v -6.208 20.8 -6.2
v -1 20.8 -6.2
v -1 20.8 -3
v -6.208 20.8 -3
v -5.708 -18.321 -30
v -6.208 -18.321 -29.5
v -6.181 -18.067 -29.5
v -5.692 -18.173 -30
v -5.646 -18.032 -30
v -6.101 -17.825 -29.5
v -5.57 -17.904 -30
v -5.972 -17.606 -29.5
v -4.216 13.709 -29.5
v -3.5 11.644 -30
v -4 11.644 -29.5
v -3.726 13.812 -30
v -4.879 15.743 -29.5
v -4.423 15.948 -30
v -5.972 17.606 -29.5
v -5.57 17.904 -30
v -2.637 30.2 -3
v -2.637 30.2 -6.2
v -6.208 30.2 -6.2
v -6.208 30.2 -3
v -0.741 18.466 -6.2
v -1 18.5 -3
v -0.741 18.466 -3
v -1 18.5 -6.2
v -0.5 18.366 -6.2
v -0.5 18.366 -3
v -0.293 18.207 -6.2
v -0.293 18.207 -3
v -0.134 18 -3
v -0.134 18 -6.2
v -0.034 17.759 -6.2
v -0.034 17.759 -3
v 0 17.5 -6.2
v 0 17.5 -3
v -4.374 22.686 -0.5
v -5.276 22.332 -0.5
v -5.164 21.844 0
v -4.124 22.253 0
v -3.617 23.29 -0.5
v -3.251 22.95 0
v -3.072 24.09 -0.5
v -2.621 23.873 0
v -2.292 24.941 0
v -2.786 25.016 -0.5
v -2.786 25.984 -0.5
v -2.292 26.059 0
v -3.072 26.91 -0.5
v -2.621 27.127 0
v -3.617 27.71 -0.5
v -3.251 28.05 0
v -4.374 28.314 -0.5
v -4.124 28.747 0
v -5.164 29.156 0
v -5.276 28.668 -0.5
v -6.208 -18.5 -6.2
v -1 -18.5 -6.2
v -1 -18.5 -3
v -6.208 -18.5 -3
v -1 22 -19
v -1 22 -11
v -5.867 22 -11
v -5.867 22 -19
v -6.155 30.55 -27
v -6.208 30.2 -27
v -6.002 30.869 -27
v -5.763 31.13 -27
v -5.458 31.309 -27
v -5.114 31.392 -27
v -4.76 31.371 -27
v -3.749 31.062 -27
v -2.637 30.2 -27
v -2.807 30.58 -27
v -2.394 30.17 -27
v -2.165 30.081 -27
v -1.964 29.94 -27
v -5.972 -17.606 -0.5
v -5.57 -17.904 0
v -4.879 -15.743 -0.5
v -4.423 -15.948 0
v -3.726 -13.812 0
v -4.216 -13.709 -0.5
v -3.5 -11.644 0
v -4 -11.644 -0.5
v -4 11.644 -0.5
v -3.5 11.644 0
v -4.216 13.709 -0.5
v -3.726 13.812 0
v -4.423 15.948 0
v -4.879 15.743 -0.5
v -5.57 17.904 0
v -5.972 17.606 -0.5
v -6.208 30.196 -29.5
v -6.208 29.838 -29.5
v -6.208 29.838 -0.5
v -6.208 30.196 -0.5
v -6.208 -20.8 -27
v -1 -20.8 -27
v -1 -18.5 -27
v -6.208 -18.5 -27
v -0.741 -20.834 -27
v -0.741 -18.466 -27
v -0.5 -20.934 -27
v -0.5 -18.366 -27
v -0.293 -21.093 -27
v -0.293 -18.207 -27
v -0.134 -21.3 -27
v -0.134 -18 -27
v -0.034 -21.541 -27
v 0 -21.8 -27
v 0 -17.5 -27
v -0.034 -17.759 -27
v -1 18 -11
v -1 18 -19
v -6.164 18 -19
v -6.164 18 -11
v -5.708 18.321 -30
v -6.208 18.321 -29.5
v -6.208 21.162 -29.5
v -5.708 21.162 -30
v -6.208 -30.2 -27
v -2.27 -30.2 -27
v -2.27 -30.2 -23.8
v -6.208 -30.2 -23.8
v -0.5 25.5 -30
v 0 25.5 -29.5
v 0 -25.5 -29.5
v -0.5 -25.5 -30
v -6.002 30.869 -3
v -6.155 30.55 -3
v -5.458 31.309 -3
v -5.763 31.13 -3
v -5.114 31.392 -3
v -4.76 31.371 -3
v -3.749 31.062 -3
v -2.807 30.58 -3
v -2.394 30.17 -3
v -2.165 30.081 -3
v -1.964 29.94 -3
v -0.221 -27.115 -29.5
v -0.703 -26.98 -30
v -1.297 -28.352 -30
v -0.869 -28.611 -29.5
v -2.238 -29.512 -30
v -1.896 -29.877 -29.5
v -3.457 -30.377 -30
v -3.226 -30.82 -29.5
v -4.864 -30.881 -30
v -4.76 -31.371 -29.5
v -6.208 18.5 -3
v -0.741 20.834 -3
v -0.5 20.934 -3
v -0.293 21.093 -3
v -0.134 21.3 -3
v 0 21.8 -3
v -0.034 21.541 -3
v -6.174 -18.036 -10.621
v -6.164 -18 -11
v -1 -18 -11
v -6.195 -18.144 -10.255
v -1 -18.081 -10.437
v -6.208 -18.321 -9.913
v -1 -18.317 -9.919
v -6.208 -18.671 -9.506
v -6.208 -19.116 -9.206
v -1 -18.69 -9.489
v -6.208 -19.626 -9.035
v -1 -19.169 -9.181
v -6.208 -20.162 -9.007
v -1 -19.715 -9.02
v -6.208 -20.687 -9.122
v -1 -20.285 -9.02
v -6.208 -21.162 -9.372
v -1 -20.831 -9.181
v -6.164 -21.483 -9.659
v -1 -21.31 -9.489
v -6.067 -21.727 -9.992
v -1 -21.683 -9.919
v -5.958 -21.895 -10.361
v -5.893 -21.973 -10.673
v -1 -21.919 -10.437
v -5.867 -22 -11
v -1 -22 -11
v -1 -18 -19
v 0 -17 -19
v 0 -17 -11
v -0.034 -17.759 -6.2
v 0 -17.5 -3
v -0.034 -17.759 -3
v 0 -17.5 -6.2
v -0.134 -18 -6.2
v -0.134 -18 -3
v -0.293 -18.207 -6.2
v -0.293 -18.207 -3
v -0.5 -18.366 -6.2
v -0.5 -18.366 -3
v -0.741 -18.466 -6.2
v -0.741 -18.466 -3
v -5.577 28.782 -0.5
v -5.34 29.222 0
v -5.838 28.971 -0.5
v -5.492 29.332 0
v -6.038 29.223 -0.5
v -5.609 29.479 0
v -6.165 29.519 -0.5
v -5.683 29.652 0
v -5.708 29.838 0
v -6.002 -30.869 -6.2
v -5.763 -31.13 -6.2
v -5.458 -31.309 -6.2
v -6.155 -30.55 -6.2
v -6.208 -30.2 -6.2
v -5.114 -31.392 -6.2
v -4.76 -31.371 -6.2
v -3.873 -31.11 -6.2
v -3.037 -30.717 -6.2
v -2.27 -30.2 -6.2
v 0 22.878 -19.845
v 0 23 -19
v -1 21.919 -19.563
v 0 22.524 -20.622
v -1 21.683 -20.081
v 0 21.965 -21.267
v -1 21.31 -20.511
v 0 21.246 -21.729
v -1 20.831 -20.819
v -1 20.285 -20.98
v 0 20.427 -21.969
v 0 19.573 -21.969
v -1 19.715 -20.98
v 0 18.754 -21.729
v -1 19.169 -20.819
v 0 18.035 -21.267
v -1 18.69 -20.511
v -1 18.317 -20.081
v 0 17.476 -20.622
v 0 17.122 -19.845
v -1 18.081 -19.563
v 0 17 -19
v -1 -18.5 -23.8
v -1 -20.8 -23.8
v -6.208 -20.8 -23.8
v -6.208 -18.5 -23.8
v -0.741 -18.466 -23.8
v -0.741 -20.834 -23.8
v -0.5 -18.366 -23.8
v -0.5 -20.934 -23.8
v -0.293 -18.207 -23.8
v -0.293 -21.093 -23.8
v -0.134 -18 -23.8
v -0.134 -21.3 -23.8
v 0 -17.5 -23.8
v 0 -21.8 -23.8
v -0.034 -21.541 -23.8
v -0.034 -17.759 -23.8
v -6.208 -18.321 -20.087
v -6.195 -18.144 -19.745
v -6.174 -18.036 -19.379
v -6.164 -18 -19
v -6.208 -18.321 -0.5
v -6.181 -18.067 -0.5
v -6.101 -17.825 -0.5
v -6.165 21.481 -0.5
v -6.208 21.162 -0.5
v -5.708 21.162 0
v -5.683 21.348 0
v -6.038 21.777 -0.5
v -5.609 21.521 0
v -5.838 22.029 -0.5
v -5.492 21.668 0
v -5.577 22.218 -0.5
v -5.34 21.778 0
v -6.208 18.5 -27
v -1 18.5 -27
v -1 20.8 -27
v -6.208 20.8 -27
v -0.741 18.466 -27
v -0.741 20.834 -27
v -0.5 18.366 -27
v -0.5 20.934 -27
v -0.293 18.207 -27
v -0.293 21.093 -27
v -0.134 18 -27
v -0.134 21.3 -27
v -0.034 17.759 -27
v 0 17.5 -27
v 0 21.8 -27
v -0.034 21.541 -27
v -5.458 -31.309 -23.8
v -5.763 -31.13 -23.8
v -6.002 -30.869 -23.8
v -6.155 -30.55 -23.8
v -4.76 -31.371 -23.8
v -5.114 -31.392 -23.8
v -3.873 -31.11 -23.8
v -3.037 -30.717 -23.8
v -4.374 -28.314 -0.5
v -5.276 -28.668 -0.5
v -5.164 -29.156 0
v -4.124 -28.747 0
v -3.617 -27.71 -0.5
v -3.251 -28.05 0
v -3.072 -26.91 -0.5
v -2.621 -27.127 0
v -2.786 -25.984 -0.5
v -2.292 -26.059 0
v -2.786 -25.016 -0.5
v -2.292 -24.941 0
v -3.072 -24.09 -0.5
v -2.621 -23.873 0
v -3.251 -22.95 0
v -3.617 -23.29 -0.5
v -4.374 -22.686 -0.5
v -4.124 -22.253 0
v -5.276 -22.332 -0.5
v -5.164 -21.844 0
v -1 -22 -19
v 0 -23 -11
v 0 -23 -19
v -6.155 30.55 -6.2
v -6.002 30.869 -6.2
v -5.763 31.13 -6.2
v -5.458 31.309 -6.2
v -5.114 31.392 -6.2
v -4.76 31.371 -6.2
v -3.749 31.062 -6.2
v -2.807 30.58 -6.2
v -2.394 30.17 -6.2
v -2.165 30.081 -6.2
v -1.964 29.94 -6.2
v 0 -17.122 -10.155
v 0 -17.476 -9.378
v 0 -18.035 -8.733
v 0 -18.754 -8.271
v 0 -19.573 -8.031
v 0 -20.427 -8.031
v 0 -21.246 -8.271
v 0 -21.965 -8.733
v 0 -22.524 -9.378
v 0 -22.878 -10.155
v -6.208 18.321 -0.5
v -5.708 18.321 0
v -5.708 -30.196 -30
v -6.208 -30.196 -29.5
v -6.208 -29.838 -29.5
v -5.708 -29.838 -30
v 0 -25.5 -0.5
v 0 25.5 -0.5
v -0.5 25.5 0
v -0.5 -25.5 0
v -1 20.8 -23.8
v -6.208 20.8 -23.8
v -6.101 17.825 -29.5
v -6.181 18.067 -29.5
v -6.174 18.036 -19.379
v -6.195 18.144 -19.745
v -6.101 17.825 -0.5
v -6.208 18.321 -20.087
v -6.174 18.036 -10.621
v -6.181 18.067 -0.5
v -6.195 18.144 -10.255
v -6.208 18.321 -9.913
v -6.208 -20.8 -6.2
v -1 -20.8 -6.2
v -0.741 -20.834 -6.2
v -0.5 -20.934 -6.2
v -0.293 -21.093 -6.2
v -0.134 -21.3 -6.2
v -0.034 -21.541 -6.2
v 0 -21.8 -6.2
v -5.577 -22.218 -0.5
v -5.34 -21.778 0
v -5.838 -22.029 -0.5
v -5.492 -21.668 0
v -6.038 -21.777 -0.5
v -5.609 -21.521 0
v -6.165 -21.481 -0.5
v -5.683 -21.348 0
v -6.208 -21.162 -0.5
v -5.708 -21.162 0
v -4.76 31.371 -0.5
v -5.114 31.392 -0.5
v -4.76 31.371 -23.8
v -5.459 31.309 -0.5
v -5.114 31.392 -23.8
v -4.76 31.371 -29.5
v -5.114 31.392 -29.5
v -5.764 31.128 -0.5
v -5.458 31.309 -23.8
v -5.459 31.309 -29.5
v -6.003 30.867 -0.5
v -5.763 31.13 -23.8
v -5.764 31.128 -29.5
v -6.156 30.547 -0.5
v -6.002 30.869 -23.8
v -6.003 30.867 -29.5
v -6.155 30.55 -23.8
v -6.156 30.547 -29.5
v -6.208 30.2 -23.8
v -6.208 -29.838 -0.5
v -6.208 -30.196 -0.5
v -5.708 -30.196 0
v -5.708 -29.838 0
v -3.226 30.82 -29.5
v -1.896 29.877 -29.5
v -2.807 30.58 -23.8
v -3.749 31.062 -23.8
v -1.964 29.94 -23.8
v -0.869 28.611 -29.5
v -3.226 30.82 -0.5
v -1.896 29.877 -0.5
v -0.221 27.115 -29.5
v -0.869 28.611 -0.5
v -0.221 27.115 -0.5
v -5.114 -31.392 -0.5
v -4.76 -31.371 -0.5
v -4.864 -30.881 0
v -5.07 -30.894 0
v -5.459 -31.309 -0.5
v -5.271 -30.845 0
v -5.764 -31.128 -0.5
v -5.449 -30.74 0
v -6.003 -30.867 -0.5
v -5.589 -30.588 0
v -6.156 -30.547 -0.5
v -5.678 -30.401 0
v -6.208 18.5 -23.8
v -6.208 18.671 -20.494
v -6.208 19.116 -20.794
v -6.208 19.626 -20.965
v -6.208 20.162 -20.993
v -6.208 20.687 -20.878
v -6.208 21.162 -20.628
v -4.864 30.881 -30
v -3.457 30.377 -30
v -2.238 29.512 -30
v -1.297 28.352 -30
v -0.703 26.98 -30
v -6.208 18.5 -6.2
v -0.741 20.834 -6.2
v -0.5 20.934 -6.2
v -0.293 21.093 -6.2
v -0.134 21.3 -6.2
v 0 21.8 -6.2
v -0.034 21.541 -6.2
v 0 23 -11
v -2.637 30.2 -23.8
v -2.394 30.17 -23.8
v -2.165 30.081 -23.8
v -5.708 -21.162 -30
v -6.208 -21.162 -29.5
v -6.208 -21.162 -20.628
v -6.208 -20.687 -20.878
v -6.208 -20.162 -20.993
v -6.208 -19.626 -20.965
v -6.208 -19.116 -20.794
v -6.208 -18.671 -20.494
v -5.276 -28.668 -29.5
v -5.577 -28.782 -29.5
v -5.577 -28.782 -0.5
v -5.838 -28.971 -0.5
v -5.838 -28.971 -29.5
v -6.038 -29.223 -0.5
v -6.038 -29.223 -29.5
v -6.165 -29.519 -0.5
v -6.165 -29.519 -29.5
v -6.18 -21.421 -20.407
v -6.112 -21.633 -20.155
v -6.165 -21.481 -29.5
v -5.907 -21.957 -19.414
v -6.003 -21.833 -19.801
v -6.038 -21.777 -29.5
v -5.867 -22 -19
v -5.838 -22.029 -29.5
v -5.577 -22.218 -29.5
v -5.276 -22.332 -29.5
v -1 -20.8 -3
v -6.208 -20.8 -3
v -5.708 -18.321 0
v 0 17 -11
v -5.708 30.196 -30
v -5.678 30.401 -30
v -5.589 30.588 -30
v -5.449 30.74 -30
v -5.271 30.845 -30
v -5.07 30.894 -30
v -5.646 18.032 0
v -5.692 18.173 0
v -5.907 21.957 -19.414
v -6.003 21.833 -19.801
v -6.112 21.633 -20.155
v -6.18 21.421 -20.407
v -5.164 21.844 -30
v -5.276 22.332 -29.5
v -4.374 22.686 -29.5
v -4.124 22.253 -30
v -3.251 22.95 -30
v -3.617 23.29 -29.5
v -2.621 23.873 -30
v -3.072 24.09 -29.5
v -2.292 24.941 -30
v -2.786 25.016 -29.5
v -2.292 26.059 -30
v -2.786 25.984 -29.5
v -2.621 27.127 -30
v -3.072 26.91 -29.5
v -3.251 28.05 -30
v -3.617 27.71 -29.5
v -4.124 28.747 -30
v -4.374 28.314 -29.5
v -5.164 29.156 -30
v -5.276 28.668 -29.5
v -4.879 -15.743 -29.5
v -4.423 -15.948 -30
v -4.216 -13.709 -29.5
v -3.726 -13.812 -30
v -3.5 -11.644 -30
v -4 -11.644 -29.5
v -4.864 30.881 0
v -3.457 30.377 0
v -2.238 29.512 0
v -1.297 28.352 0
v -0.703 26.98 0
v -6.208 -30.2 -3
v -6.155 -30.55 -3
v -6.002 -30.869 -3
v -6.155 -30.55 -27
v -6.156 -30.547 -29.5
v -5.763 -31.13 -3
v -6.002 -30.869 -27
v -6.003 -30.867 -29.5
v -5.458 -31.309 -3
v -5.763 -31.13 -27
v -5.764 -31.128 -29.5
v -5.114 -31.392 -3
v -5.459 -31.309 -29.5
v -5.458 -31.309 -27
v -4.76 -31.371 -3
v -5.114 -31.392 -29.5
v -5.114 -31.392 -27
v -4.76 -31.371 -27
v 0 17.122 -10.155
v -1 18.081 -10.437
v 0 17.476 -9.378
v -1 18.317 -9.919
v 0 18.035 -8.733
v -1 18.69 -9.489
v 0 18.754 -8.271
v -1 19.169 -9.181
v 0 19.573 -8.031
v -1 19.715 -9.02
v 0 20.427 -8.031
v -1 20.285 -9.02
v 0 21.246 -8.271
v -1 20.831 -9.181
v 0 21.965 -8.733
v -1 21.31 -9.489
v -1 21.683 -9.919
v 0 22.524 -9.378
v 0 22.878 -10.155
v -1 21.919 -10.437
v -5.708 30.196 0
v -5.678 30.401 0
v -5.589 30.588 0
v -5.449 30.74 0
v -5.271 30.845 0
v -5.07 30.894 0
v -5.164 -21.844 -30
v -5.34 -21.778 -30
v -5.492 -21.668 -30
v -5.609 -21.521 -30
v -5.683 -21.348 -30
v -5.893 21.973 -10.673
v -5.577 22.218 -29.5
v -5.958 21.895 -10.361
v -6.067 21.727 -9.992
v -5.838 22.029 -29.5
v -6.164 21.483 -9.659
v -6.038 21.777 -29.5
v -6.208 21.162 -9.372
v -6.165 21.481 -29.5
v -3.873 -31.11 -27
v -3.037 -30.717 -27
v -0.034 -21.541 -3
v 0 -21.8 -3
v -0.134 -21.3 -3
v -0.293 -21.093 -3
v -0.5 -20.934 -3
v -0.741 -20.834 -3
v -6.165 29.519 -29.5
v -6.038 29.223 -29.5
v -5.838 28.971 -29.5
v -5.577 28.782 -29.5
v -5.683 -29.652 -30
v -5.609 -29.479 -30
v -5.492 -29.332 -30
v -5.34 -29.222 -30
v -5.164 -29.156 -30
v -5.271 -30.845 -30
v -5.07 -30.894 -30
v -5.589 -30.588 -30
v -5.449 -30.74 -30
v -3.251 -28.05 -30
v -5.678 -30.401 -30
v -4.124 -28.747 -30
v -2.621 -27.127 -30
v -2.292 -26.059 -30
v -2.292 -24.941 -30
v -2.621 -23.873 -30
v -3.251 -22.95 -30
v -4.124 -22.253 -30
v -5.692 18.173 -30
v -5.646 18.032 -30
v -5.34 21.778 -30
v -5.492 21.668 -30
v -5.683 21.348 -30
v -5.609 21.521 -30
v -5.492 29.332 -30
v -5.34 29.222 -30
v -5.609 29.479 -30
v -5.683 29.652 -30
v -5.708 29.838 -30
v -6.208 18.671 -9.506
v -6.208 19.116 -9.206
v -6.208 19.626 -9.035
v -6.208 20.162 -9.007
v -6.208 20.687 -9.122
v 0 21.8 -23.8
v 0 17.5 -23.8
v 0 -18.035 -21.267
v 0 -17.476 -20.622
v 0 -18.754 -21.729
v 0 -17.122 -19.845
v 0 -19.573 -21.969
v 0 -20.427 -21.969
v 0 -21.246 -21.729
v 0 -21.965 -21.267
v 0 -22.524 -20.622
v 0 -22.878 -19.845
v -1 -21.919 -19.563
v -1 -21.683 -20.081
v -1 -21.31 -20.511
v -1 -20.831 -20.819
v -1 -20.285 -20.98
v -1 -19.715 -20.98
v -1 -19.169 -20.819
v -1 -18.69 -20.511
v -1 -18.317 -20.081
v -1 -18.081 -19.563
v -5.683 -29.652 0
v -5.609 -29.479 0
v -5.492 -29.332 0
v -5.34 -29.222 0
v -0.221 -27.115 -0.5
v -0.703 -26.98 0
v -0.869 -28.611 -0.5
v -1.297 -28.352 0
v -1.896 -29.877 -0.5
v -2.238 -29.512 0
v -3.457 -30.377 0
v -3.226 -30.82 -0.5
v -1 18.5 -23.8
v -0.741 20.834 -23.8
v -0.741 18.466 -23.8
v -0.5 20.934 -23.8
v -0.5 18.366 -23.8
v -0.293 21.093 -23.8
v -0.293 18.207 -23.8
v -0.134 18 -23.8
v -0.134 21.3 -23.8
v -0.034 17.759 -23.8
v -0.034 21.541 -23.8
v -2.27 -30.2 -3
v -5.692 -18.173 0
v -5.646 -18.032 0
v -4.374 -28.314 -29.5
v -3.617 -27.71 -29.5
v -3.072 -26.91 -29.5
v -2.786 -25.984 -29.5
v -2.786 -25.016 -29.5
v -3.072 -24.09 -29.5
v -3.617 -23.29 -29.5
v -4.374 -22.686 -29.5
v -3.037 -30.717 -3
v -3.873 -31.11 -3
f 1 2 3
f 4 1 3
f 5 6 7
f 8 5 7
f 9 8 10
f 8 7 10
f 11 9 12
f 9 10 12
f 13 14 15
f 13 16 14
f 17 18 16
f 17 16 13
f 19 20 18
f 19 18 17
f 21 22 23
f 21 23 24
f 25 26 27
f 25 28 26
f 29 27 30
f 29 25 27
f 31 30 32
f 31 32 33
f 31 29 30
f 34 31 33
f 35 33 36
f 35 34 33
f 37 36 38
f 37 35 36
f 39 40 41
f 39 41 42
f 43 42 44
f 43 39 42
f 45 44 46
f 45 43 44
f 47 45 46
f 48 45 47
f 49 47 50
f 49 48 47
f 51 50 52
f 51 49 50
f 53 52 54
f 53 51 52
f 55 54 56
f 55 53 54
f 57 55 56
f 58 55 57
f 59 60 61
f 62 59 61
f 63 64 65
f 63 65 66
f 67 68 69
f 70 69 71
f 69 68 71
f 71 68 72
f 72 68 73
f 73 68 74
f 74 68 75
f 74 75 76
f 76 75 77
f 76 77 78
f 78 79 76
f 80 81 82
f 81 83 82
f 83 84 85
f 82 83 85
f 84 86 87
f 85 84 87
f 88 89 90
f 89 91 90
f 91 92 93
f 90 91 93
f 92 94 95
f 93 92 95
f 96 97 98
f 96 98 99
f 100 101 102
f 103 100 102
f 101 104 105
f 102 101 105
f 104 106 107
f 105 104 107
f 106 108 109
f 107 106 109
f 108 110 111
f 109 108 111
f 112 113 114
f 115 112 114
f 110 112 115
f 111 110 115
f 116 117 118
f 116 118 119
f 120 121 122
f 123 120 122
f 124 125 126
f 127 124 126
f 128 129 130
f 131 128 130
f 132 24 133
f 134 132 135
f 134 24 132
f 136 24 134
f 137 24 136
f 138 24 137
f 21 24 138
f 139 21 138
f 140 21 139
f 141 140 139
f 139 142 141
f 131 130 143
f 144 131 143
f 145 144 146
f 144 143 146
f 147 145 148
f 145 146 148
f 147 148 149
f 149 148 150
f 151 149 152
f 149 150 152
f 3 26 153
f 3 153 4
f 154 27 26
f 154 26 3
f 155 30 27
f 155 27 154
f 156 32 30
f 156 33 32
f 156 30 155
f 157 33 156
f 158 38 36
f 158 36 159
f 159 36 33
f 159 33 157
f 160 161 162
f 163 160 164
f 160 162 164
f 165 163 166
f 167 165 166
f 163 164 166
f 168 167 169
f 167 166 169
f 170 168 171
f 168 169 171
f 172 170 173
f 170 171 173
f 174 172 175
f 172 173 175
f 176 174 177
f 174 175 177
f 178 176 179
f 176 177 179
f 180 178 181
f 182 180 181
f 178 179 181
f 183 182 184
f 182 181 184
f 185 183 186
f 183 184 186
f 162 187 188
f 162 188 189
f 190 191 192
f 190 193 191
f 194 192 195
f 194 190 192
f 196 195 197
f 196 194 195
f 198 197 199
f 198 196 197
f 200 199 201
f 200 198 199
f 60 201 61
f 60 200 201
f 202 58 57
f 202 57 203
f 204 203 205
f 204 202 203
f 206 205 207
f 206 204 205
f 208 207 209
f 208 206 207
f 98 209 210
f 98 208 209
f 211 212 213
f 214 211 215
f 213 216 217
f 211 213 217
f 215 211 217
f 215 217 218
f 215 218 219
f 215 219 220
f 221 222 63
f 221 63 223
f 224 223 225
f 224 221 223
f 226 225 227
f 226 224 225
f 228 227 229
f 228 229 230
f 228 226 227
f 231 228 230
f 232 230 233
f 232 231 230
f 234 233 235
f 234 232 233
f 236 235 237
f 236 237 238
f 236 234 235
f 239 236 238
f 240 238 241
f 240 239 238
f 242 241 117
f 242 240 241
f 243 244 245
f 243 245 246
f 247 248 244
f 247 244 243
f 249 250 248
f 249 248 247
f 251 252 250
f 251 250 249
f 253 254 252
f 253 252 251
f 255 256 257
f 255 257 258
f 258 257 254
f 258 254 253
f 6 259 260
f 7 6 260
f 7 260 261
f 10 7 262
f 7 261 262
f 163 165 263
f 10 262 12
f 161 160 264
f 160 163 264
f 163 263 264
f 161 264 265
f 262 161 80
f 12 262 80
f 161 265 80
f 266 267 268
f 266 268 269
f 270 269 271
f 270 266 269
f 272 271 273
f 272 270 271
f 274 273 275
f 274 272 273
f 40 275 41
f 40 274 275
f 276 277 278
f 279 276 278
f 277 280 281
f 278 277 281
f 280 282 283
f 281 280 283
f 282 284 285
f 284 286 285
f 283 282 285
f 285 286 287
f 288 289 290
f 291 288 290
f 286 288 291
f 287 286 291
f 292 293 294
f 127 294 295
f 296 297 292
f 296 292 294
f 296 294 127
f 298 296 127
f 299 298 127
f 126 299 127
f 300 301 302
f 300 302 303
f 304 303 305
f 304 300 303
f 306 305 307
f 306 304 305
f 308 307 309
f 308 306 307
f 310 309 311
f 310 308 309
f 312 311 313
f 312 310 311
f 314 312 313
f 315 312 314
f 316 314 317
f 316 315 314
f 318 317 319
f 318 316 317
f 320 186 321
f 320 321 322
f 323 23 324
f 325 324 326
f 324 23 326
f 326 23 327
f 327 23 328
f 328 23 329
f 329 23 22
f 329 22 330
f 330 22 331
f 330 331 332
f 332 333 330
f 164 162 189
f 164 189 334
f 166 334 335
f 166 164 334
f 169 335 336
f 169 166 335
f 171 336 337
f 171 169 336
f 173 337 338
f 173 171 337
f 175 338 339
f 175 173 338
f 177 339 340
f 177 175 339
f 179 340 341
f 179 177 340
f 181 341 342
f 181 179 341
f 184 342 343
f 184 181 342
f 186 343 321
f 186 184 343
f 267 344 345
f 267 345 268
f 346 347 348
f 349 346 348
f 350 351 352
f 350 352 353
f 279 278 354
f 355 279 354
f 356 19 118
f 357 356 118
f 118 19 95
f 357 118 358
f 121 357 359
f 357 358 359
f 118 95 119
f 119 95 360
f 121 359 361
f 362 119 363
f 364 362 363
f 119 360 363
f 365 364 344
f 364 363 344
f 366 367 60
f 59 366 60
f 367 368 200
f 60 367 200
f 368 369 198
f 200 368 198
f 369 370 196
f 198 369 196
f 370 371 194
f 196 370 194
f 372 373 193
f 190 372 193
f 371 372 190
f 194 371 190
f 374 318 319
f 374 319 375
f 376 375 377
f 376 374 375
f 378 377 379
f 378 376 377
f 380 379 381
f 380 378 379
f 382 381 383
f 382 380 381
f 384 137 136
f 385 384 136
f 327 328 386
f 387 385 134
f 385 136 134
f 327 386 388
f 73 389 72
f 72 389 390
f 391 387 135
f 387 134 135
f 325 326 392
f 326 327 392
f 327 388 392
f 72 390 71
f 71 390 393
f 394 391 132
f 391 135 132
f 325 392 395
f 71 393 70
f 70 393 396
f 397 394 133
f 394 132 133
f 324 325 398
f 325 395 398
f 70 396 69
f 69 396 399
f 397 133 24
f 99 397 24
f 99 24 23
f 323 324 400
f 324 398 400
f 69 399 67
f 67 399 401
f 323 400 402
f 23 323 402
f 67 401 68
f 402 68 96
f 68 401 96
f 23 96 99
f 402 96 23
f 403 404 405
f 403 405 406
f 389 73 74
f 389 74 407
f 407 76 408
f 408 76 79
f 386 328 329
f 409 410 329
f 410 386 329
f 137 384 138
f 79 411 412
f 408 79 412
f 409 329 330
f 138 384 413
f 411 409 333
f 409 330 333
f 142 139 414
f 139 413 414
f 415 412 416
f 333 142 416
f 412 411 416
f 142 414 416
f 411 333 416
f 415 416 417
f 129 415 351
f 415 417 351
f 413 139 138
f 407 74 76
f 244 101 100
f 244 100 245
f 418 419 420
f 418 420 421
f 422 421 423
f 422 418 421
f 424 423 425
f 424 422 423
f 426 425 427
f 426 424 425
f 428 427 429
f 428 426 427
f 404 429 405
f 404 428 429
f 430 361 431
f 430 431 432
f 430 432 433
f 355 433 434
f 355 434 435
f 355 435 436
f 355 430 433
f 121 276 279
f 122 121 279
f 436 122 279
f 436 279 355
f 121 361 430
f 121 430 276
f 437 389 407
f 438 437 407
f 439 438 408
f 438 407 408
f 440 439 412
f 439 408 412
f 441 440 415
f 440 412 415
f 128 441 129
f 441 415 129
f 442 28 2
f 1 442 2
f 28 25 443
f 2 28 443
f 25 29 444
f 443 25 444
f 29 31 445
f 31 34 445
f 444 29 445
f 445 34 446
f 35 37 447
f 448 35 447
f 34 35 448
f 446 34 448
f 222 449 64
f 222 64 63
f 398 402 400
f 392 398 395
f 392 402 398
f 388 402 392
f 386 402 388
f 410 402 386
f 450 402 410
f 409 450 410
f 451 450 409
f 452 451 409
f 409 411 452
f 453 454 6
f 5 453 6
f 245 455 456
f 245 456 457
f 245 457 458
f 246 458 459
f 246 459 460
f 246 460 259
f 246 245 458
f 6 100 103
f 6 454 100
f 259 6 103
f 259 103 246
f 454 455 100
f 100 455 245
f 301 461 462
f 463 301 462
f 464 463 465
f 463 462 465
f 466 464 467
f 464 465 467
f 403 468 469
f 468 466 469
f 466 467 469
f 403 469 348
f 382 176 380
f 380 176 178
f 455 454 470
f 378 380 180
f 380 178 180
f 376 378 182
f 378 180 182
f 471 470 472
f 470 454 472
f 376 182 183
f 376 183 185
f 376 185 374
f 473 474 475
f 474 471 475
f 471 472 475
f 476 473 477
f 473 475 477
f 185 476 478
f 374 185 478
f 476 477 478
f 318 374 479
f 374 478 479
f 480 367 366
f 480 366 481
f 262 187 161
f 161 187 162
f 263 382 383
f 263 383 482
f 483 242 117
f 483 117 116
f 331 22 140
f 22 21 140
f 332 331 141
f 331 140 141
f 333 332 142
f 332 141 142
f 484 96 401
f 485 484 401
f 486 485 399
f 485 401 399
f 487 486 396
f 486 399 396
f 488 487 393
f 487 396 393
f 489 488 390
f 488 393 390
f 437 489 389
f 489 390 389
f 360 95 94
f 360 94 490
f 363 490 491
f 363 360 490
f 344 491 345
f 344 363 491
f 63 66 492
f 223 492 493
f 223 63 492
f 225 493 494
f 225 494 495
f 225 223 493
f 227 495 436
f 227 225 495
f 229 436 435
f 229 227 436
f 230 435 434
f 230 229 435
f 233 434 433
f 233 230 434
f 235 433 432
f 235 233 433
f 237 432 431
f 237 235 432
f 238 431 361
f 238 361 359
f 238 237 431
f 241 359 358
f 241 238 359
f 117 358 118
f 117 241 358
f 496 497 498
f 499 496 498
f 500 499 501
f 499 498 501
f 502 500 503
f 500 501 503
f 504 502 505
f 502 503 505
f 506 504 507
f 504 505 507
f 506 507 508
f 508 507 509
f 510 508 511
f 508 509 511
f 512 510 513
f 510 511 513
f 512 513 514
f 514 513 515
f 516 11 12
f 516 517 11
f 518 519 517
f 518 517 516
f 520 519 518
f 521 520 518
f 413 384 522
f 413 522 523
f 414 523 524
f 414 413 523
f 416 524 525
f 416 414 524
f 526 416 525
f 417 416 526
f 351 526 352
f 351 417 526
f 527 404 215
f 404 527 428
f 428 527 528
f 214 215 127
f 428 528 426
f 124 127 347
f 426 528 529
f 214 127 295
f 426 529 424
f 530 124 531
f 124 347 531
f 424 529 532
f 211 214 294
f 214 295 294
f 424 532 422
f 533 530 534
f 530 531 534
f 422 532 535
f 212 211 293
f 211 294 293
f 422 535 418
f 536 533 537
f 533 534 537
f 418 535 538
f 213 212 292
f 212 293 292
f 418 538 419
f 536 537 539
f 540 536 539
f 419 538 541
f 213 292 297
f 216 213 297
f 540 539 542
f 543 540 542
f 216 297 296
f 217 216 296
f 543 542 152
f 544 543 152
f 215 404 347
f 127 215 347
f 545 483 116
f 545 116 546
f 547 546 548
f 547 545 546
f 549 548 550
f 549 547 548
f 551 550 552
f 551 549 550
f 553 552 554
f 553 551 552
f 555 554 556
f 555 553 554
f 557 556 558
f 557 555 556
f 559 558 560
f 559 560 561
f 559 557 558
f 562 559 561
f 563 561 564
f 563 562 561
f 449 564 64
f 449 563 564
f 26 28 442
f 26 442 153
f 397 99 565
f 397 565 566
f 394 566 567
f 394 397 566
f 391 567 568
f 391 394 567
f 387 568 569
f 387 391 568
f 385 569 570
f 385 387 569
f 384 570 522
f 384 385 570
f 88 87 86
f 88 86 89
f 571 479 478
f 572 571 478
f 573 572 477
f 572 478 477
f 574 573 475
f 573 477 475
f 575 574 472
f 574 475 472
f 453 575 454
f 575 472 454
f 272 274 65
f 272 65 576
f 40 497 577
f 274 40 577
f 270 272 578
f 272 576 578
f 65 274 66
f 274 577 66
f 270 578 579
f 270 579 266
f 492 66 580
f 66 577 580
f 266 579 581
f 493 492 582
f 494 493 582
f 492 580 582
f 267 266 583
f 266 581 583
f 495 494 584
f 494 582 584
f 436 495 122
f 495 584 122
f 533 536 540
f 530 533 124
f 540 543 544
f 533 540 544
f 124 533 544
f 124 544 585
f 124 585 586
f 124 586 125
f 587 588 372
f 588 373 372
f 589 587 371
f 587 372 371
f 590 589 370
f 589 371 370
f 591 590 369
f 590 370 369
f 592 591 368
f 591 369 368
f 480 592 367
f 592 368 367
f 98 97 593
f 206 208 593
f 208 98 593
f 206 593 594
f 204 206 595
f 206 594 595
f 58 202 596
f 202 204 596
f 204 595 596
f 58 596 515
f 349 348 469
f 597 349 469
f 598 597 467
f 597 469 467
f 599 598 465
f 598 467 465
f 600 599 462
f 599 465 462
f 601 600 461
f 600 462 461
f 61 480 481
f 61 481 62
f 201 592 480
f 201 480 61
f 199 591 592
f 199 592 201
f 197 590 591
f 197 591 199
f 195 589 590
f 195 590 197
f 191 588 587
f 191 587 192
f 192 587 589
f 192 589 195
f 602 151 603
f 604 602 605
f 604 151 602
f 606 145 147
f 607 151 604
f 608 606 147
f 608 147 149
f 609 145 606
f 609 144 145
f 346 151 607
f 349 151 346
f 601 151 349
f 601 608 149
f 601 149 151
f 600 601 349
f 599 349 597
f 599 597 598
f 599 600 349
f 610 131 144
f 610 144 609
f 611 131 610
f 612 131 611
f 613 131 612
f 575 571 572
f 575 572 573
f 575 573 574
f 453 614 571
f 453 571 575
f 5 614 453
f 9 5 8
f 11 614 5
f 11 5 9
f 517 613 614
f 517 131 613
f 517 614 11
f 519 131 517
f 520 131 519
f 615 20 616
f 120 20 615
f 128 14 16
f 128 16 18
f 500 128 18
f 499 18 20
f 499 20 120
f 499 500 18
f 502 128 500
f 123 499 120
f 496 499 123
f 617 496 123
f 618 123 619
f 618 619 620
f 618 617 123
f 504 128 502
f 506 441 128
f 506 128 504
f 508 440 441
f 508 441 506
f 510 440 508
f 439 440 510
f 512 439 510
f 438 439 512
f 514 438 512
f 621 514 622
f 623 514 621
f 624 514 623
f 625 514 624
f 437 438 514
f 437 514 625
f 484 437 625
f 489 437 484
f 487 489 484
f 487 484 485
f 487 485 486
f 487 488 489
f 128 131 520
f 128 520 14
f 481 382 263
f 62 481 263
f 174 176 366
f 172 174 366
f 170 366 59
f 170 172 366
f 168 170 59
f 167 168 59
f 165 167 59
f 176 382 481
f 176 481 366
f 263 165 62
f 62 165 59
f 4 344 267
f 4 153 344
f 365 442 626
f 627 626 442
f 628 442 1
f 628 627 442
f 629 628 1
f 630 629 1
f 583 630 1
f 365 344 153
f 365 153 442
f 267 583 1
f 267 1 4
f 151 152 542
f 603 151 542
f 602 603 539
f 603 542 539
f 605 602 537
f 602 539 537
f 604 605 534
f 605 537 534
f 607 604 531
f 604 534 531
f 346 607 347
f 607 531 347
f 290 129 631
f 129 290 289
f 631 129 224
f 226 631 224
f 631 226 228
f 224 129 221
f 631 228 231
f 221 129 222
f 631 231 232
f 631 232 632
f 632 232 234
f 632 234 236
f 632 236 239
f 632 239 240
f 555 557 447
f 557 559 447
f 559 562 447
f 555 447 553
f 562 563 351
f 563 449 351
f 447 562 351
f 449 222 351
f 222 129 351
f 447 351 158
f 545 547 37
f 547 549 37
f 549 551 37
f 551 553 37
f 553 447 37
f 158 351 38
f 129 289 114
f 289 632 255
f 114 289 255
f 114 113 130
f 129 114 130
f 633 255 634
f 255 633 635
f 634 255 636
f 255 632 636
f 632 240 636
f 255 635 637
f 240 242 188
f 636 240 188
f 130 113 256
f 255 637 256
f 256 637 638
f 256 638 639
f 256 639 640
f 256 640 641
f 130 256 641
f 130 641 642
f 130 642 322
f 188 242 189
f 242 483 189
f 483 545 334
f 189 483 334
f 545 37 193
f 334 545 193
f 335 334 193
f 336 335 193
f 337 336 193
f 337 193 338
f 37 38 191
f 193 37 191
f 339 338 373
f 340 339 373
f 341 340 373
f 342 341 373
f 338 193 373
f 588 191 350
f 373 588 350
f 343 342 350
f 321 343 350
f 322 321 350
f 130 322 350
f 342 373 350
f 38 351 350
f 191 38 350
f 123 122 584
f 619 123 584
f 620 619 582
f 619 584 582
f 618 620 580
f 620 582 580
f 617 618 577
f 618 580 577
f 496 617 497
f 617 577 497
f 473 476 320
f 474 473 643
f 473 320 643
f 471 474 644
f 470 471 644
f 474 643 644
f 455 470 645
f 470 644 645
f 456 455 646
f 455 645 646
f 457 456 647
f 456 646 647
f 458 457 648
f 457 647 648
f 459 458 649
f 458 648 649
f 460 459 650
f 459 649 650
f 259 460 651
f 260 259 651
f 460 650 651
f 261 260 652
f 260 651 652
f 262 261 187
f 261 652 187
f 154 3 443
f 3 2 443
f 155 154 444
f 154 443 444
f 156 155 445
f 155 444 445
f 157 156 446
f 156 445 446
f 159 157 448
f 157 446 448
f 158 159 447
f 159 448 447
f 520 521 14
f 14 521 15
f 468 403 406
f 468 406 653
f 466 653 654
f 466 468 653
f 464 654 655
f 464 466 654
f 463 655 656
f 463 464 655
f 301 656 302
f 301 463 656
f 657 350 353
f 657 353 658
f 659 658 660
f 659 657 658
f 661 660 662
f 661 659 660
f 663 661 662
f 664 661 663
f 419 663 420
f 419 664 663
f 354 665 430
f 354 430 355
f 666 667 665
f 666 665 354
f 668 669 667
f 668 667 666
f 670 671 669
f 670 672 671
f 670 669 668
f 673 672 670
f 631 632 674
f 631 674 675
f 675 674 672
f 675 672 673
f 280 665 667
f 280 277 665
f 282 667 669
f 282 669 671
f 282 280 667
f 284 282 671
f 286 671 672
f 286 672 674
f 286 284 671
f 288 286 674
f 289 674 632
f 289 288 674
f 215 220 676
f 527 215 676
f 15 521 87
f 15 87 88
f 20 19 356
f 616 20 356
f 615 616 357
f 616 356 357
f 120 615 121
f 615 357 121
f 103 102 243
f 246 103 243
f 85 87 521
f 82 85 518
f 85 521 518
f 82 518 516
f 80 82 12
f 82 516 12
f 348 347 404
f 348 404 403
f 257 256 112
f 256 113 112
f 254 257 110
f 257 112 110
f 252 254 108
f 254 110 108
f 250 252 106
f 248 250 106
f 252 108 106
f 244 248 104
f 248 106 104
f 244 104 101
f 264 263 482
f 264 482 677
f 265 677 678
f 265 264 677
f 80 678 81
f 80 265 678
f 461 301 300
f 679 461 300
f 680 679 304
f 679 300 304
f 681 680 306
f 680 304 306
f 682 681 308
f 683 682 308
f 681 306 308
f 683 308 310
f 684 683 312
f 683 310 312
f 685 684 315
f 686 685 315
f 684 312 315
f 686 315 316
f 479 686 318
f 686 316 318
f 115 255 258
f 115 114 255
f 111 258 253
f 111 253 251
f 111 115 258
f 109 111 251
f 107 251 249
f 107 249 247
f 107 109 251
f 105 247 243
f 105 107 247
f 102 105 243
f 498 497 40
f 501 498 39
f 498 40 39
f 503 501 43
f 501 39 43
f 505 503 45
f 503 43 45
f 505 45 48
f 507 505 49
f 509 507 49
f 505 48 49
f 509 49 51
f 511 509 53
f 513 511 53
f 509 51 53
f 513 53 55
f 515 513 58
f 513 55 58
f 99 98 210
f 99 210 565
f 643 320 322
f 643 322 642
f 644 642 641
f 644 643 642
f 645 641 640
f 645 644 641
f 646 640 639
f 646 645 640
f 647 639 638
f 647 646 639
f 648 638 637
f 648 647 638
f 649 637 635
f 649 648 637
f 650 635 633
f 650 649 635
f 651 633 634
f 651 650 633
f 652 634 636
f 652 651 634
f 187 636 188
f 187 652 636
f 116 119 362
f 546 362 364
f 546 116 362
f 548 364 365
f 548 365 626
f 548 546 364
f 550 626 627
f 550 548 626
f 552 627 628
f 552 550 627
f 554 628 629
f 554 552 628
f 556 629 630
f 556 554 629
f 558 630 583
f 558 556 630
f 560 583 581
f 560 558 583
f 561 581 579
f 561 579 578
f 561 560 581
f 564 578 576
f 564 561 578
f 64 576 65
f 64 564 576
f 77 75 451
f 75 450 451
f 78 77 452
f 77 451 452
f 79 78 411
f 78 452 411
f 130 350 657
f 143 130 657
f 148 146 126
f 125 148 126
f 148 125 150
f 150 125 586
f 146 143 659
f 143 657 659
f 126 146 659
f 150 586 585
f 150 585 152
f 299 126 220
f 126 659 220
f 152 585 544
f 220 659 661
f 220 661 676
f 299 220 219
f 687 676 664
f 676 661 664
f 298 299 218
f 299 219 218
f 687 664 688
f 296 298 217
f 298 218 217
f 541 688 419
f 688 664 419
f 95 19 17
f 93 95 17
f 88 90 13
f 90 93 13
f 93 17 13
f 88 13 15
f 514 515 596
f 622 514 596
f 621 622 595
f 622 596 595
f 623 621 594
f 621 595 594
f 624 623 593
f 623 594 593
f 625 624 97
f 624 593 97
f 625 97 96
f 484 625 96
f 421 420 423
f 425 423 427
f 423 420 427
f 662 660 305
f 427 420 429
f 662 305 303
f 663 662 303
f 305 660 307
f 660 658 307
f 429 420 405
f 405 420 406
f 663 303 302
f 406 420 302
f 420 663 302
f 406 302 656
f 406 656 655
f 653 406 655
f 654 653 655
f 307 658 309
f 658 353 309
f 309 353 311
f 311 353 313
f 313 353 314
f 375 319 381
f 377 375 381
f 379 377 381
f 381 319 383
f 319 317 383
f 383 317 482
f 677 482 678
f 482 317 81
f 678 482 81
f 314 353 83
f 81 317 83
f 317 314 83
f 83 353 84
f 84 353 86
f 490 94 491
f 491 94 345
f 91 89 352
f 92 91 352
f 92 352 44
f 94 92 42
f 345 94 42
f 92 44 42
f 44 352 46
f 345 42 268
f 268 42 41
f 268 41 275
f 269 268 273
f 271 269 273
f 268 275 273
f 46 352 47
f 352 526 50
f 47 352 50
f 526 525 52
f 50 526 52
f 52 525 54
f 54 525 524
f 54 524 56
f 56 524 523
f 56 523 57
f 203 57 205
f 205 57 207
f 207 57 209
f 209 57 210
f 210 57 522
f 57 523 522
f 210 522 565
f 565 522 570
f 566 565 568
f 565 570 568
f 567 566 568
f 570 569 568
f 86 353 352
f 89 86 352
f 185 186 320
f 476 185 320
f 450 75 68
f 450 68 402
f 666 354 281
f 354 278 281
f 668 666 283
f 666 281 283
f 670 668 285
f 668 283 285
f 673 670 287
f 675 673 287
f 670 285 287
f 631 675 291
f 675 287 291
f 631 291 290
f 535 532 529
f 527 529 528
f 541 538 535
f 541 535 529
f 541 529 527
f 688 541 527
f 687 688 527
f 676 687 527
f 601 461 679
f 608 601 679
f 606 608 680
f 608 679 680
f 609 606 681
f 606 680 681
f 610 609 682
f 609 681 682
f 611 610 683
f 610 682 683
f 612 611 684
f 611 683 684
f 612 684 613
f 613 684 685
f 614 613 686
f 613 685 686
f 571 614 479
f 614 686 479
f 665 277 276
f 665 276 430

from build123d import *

# Parameters (mm, degrees)
CROQUIS1_R                 = 3.25
SALIENTE_EXTRUIR1_DEPTH    = 30
REDONDEO1_R                = 10
CORTAR_EXTRUIR1_DEPTH      = 46.124827032
CROQUIS3_W                 = 19.168620823
CROQUIS3_H                 = 82.221468015
CORTAR_EXTRUIR2_DEPTH      = 46.124827032
CORTAR_EXTRUIR7_DEPTH      = 44.68352107
CORTAR_EXTRUIR7_DEPTH_BACK = 44.68352107
CROQUIS4_W                 = 3.2
CROQUIS4_H                 = 2.3
REDONDEO2_R                = 1.2
REDONDEO4_R                = 1
CHAMFER1_SIZE              = 0.5
CHAMFER2_SIZE              = 1


with BuildPart() as part:
    # Croquis1 → Saliente-Extruir1 (new body)
    with BuildSketch(Plane.XY):
        with BuildLine():
            Line((-4, 17.433827309), (-8.98691391, 20.296314259))
            ThreePointArc((-8.98691391, 20.296314259), (-9.006535925, 30.69237342), (0, 25.5))
            Line((0, 25.5), (0, -25.5))
            ThreePointArc((0, -25.5), (-9.006535925, -30.69237342), (-8.98691391, -20.296314259))
            Line((-8.98691391, -20.296314259), (-4, -17.433827309))
            Line((-4, -17.433827309), (-4, 17.433827309))
        make_face()
        with Locations((-6, 25.5)):
            Circle(CROQUIS1_R, mode=Mode.SUBTRACT)
        with Locations(Location((-6, -25.5, 0), (0, 0, 180))):
            Circle(CROQUIS1_R, mode=Mode.SUBTRACT)
    extrude(amount=-SALIENTE_EXTRUIR1_DEPTH)

    # Redondeo1
    redondeo1_edges = [part.edges().sort_by_distance(p)[0] for p in [
        (-4, -17.433827309, -15),
        (-4, 17.433827309, -15),
    ]]
    fillet(redondeo1_edges, radius=REDONDEO1_R)

    # Croquis2 → Cortar-Extruir1 (cut, through all)
    with BuildSketch(Plane(origin=(0, 0, 0), x_dir=(0, 0, -1), z_dir=(1, 0, 0))):
        with BuildLine():
            Line((11, 22), (19, 22))
            ThreePointArc((19, 22), (21, 20), (19, 18))
            Line((19, 18), (11, 18))
            ThreePointArc((11, 18), (9, 20), (11, 22))
        make_face()
        with BuildLine():
            Line((11, -22), (19, -22))
            ThreePointArc((19, -22), (21, -20), (19, -18))
            Line((19, -18), (11, -18))
            ThreePointArc((11, -18), (9, -20), (11, -22))
        make_face()
    extrude(amount=-CORTAR_EXTRUIR1_DEPTH, mode=Mode.SUBTRACT)

    # Croquis3 → Cortar-Extruir2 (cut, through all)
    with BuildSketch(Plane(origin=(0, 0, -30), x_dir=(-1, 0, 0), z_dir=(0, 0, -1))):
        with Locations((15.792539244, 3.658464898)):
            Rectangle(CROQUIS3_W, CROQUIS3_H)
    extrude(amount=-CORTAR_EXTRUIR2_DEPTH, mode=Mode.SUBTRACT)

    # Croquis4 → Cortar-Extruir7 (cut, two sides: drawn at the far end of the back side and taken through both)
    with BuildSketch(Plane.ZY.offset(4).offset(-CORTAR_EXTRUIR7_DEPTH_BACK)):
        with Locations((-4.6, 31.35)):
            Rectangle(CROQUIS4_W, CROQUIS4_H)
        with Locations((-25.4, 31.35)):
            Rectangle(CROQUIS4_W, CROQUIS4_H)
        with Locations((-25.4, 19.65)):
            Rectangle(CROQUIS4_W, CROQUIS4_H)
        with Locations((-4.6, 19.65)):
            Rectangle(CROQUIS4_W, CROQUIS4_H)
        with Locations((-4.6, -19.65)):
            Rectangle(CROQUIS4_W, CROQUIS4_H)
        with Locations((-25.4, -19.65)):
            Rectangle(CROQUIS4_W, CROQUIS4_H)
        with Locations((-4.6, -31.35)):
            Rectangle(CROQUIS4_W, CROQUIS4_H)
        with Locations((-25.4, -31.35)):
            Rectangle(CROQUIS4_W, CROQUIS4_H)
    extrude(amount=CORTAR_EXTRUIR7_DEPTH + CORTAR_EXTRUIR7_DEPTH_BACK, mode=Mode.SUBTRACT)

    # Redondeo2
    # the kernel refuses this fillet: 1.2 mm, written as the material it takes off along each edge
    with BuildSketch(Plane(origin=(-6.208228832, 31.496385641, -6.633505757), x_dir=(0.9962436341156765, -0.08659458114680287, 0), z_dir=(0, 0, 1)), Plane(origin=(-6.208228832, 31.496385641, -33.633505757), x_dir=(0.9962436341156765, -0.08659458114680287, 0), z_dir=(0, 0, 1))) as redondeo2_piece_1:
        with BuildLine():
            CenterArc((1.308062073, -1.191165907), REDONDEO2_R, 83.043435968, 101.924289818)
            Line((0.112569712, -1.295079404), (0, 0))
            ThreePointArc((0, 0), (0.726701151, 0.044170466), (1.453402303, 0))
        make_face()
    extrude(amount=10.267011514, mode=Mode.SUBTRACT)
    with BuildSketch(Plane(origin=(-6.208228832, -31.496385641, -33.633505757), x_dir=(0.9962436341156764, 0.08659458114680295, 0), z_dir=(0, 0, 1)), Plane(origin=(-6.208228832, -31.496385641, -6.633505757), x_dir=(0.9962436341156764, 0.08659458114680295, 0), z_dir=(0, 0, 1))) as redondeo2_piece_2:
        with BuildLine():
            CenterArc((1.308062073, 1.191165907), REDONDEO2_R, 175.032274214, 101.924289818)
            Line((0.112569712, 1.295079404), (0, 0))
            ThreePointArc((0, 0), (0.726701151, -0.044170466), (1.453402303, 0))
        make_face()
    extrude(amount=10.267011514, mode=Mode.SUBTRACT)
    with BuildSketch(Plane(origin=(-6.208228832, 28.743322487, -32.736879913), x_dir=(0, 1, 0), z_dir=(0, 0, 1))) as redondeo2_piece_3:
        with BuildLine():
            CenterArc((1.094751965, -1.2), REDONDEO2_R, 90, 77.122346342)
            ThreePointArc((-0.075065865, -0.93255609), (-0.003800627, -0.468993318), (0, 0))
            Line((0, 0), (1.094751965, 0))
        make_face()
    extrude(amount=35.473759826, mode=Mode.SUBTRACT)
    with BuildSketch(Plane(origin=(-6.208228832, 22.256677513, -32.736879913), x_dir=(0, -1, 0), z_dir=(0, 0, 1)), Plane(origin=(-6.208228832, -28.743322487, -32.736879913), x_dir=(0, -1, 0), z_dir=(0, 0, 1))) as redondeo2_piece_4:
        with BuildLine():
            CenterArc((1.094751965, 1.2), REDONDEO2_R, 192.877653658, 77.122346342)
            ThreePointArc((-0.075065865, 0.93255609), (-0.003800627, 0.468993318), (0, 0))
            Line((0, 0), (1.094751965, 0))
        make_face()
    extrude(amount=35.473759826, mode=Mode.SUBTRACT)
    with BuildSketch(Plane(origin=(-6.208228832, 17.911631675, 1.023475891), x_dir=(0.6116158089577609, -0.7911549167090751, 0), z_dir=(0, 0, -1))) as redondeo2_piece_5:
        with BuildLine():
            CenterArc((0.410047777, -1.199775514), REDONDEO2_R, 91.108276989, 36.598151405)
            Line((-0.323891193, -0.250389614), (0, 0))
            ThreePointArc((0, 0), (0.193418763, -0.001870716), (0.386837526, 0))
        make_face()
    extrude(amount=32.046951782, mode=Mode.SUBTRACT)
    with BuildSketch(Plane(origin=(-6.208228832, -22.256677513, -32.736879913), x_dir=(0.9967759569904702, -0.0802352264640189, 0), z_dir=(0, 0, 1))) as redondeo2_piece_6:
        with BuildLine():
            CenterArc((1.108293477, 1.187504709), REDONDEO2_R, 184.602086684, 77.122346342)
            Line((-0.087837672, 1.091222438), (0, 0))
            ThreePointArc((0, 0), (0.467786208, 0.033841412), (0.935572415, 0))
        make_face()
    extrude(amount=35.473759826, mode=Mode.SUBTRACT)
    with BuildSketch(Plane(origin=(-6.208228832, -17.911631675, 1.023475891), x_dir=(0, -1, 0), z_dir=(0, 0, -1))) as redondeo2_piece_7:
        with BuildLine():
            CenterArc((0.409390356, -1.2), REDONDEO2_R, 90, 36.598151405)
            ThreePointArc((-0.306048411, -0.236595946), (-0.151880046, -0.119777999), (0, 0))
            Line((0, 0), (0.409390356, 0))
        make_face()
    extrude(amount=32.046951782, mode=Mode.SUBTRACT)
    with BuildSketch(Plane(origin=(-6.208228832, 31.496385641, -27.433505757), x_dir=(0.9962436341156765, -0.08659458114680287, 0), z_dir=(0, 0, 1))) as redondeo2_piece_8:
        with BuildLine():
            CenterArc((1.308062073, -1.191165907), REDONDEO2_R, 83.043435968, 101.924289818)
            Line((0.112569712, -1.295079404), (0, 0))
            ThreePointArc((0, 0), (0.726701151, 0.044170466), (1.453402303, 0))
        make_face()
    extrude(amount=24.867011514, mode=Mode.SUBTRACT)
    with BuildSketch(Plane(origin=(-6.208228832, -31.496385641, -27.433505757), x_dir=(0.9962436341156764, 0.08659458114680295, 0), z_dir=(0, 0, 1))) as redondeo2_piece_9:
        with BuildLine():
            CenterArc((1.308062073, 1.191165907), REDONDEO2_R, 175.032274214, 101.924289818)
            Line((0.112569712, 1.295079404), (0, 0))
            ThreePointArc((0, 0), (0.726701151, -0.044170466), (1.453402303, 0))
        make_face()
    extrude(amount=24.867011514, mode=Mode.SUBTRACT)

    # Redondeo4
    redondeo4_edges = [part.edges().sort_by_distance(p)[0] for p in [
        (0, -18.5, -25.4),
        (0, -20.8, -25.4),
        (0, -18.5, -4.6),
        (0, -20.8, -4.6),
        (-2.27038876, 30.2, -4.6),
        (0, 18.5, -25.4),
        (0, 20.8, -25.4),
        (0, 18.5, -4.6),
        (0, 20.8, -4.6),
        (-2.27038876, 30.2, -25.4),
    ]]
    fillet(redondeo4_edges, radius=REDONDEO4_R)

    # Chamfer1
    chamfer1_edges = [part.edges().sort_by_distance(p)[0] for p in [
        (0, 0, -30),
        (-4, 0, 0),
        (-4, 0, -30),
        (-6.208228832, -30.017248777, 0),
        (-6.208228832, -30.017248777, -30),
        (-1.339619985, -29.279002265, 0),
        (-6.208228832, 30.017248777, 0),
        (-2.75, 25.5, 0),
        (-6.208228832, 19.74147379, 0),
        (-4.505694572, 14.783364937, 0),
        (-6.208228832, -19.74147379, 0),
        (-2.75, -25.5, 0),
        (-5.946560515, 29.09005463, 0),
        (-5.946560515, 21.90994537, 0),
        (-5.764029285, 31.128499105, 0),
        (-6.147545484, 17.944249464, 0),
        (-6.147545484, -17.944249464, 0),
        (-5.946560515, -21.90994537, 0),
        (-5.946560515, -29.09005463, 0),
        (-5.764029285, -31.128499105, 0),
        (-1.339619985, -29.279002265, -30),
        (-6.208228832, 30.017248777, -30),
        (-2.75, -25.5, -30),
        (-6.208228832, -19.74147379, -30),
        (-4.505694572, -14.783364937, -30),
        (-6.208228832, 19.74147379, -30),
        (-2.75, 25.5, -30),
        (-5.946560515, 29.09005463, -30),
        (-5.946560515, 21.90994537, -30),
        (-6.147545484, 17.944249464, -30),
        (-6.147545484, -17.944249464, -30),
        (-5.946560515, -21.90994537, -30),
        (-5.946560515, -29.09005463, -30),
        (-5.764029285, -31.128499105, -30),
        (-5.764029285, 31.128499105, -30),
        (-4.505694572, -14.783364937, 0),
        (-4.505694572, 14.783364937, -30),
        (-1.339619985, 29.279002265, -30),
        (0, 0, 0),
        (-1.339619985, 29.279002265, 0),
    ]]
    chamfer(chamfer1_edges, length=CHAMFER1_SIZE)

    # Chamfer2
    chamfer2_edges = [part.edges().sort_by_distance(p)[0] for p in [
        (0, 20, -9),
        (0, 18, -15),
        (0, 20, -21),
        (0, 22, -15),
        (0, -20, -9),
        (0, -22, -15),
        (0, -20, -21),
        (0, -18, -15),
    ]]
    chamfer(chamfer2_edges, length=CHAMFER2_SIZE)


solid = part.part
